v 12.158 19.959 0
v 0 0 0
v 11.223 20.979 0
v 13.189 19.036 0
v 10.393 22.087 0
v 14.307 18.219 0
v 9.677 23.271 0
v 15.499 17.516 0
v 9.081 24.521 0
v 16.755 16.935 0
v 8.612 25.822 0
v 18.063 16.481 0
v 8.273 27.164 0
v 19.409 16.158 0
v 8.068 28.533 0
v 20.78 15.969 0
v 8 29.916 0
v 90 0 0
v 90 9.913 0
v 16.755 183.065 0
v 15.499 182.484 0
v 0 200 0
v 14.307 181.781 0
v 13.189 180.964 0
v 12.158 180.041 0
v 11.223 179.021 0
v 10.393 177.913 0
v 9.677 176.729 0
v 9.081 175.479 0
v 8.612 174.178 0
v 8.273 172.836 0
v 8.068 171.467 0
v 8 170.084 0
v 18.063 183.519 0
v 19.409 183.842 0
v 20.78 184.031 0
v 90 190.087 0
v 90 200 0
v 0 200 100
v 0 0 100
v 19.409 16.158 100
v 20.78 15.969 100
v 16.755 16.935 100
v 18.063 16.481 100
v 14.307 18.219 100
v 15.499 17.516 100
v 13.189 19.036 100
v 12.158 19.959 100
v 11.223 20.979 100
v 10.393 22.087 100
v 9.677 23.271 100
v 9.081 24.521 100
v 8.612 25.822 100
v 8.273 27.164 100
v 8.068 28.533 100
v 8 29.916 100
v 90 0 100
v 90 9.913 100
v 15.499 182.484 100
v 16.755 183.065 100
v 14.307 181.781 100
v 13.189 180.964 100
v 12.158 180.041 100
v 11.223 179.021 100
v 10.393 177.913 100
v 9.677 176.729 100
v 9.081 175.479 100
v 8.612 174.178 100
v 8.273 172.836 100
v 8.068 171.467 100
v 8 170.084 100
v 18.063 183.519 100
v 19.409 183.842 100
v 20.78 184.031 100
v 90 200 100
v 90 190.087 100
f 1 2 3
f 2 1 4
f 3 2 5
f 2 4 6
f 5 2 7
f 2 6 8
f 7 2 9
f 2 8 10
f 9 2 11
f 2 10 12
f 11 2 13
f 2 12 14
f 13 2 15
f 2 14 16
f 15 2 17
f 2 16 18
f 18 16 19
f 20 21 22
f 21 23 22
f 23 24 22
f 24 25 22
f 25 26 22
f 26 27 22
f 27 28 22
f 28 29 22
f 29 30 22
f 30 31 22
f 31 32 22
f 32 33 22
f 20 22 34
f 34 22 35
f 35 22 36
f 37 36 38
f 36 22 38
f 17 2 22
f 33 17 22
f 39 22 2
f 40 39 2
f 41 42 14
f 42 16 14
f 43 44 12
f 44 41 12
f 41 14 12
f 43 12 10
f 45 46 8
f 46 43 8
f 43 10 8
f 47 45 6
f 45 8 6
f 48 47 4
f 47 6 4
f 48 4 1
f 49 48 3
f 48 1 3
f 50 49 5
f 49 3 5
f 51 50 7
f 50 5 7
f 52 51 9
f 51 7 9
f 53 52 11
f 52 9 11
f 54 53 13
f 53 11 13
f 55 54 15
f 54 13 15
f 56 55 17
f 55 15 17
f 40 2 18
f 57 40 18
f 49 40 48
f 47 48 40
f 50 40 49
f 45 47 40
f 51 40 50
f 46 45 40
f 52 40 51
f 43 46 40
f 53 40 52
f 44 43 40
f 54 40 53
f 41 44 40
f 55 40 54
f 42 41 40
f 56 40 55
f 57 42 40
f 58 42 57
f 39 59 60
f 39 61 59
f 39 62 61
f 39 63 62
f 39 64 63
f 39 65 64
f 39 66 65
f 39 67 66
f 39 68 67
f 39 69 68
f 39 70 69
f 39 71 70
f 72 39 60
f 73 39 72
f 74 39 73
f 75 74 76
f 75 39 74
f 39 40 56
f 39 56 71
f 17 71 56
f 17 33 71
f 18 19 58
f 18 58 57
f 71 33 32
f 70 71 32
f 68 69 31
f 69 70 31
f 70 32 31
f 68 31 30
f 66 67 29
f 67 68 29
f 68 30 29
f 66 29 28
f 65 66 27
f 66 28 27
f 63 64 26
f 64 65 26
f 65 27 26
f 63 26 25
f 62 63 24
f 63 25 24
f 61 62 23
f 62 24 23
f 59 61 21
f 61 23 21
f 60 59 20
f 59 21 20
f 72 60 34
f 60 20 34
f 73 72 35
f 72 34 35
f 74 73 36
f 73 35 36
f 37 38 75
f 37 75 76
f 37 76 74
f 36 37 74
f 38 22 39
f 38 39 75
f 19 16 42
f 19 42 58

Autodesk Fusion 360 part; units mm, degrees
sketch "スケッチ1" plane through (0, 0, 0) normal (0, 0, 1) x (1, 0, 0)
  arc A0 (20.7798, 184.0311) -> (8, 170.0843) centre (22, 170.0843) ccw
  line L0 (90, 190.087) -> (20.7798, 184.0311)
  line L1 (0, 200) -> (0, 0)
  line L2 (8, 170.0843) -> (8, 29.9157)
  line L3 (0, 0) -> (90, 0)
  line L4 (20.7798, 15.9689) -> (90, 9.913)
  arc A1 (8, 29.9157) -> (20.7798, 15.9689) centre (22, 29.9157) ccw
  line L5 (90, 9.913) -> (90, 0)
  line L6 (0, 200) -> (90, 200)
  line L7 (90, 200) -> (90, 190.087)
extrude "押し出し1" add sketch "スケッチ1" along normal blind 100
